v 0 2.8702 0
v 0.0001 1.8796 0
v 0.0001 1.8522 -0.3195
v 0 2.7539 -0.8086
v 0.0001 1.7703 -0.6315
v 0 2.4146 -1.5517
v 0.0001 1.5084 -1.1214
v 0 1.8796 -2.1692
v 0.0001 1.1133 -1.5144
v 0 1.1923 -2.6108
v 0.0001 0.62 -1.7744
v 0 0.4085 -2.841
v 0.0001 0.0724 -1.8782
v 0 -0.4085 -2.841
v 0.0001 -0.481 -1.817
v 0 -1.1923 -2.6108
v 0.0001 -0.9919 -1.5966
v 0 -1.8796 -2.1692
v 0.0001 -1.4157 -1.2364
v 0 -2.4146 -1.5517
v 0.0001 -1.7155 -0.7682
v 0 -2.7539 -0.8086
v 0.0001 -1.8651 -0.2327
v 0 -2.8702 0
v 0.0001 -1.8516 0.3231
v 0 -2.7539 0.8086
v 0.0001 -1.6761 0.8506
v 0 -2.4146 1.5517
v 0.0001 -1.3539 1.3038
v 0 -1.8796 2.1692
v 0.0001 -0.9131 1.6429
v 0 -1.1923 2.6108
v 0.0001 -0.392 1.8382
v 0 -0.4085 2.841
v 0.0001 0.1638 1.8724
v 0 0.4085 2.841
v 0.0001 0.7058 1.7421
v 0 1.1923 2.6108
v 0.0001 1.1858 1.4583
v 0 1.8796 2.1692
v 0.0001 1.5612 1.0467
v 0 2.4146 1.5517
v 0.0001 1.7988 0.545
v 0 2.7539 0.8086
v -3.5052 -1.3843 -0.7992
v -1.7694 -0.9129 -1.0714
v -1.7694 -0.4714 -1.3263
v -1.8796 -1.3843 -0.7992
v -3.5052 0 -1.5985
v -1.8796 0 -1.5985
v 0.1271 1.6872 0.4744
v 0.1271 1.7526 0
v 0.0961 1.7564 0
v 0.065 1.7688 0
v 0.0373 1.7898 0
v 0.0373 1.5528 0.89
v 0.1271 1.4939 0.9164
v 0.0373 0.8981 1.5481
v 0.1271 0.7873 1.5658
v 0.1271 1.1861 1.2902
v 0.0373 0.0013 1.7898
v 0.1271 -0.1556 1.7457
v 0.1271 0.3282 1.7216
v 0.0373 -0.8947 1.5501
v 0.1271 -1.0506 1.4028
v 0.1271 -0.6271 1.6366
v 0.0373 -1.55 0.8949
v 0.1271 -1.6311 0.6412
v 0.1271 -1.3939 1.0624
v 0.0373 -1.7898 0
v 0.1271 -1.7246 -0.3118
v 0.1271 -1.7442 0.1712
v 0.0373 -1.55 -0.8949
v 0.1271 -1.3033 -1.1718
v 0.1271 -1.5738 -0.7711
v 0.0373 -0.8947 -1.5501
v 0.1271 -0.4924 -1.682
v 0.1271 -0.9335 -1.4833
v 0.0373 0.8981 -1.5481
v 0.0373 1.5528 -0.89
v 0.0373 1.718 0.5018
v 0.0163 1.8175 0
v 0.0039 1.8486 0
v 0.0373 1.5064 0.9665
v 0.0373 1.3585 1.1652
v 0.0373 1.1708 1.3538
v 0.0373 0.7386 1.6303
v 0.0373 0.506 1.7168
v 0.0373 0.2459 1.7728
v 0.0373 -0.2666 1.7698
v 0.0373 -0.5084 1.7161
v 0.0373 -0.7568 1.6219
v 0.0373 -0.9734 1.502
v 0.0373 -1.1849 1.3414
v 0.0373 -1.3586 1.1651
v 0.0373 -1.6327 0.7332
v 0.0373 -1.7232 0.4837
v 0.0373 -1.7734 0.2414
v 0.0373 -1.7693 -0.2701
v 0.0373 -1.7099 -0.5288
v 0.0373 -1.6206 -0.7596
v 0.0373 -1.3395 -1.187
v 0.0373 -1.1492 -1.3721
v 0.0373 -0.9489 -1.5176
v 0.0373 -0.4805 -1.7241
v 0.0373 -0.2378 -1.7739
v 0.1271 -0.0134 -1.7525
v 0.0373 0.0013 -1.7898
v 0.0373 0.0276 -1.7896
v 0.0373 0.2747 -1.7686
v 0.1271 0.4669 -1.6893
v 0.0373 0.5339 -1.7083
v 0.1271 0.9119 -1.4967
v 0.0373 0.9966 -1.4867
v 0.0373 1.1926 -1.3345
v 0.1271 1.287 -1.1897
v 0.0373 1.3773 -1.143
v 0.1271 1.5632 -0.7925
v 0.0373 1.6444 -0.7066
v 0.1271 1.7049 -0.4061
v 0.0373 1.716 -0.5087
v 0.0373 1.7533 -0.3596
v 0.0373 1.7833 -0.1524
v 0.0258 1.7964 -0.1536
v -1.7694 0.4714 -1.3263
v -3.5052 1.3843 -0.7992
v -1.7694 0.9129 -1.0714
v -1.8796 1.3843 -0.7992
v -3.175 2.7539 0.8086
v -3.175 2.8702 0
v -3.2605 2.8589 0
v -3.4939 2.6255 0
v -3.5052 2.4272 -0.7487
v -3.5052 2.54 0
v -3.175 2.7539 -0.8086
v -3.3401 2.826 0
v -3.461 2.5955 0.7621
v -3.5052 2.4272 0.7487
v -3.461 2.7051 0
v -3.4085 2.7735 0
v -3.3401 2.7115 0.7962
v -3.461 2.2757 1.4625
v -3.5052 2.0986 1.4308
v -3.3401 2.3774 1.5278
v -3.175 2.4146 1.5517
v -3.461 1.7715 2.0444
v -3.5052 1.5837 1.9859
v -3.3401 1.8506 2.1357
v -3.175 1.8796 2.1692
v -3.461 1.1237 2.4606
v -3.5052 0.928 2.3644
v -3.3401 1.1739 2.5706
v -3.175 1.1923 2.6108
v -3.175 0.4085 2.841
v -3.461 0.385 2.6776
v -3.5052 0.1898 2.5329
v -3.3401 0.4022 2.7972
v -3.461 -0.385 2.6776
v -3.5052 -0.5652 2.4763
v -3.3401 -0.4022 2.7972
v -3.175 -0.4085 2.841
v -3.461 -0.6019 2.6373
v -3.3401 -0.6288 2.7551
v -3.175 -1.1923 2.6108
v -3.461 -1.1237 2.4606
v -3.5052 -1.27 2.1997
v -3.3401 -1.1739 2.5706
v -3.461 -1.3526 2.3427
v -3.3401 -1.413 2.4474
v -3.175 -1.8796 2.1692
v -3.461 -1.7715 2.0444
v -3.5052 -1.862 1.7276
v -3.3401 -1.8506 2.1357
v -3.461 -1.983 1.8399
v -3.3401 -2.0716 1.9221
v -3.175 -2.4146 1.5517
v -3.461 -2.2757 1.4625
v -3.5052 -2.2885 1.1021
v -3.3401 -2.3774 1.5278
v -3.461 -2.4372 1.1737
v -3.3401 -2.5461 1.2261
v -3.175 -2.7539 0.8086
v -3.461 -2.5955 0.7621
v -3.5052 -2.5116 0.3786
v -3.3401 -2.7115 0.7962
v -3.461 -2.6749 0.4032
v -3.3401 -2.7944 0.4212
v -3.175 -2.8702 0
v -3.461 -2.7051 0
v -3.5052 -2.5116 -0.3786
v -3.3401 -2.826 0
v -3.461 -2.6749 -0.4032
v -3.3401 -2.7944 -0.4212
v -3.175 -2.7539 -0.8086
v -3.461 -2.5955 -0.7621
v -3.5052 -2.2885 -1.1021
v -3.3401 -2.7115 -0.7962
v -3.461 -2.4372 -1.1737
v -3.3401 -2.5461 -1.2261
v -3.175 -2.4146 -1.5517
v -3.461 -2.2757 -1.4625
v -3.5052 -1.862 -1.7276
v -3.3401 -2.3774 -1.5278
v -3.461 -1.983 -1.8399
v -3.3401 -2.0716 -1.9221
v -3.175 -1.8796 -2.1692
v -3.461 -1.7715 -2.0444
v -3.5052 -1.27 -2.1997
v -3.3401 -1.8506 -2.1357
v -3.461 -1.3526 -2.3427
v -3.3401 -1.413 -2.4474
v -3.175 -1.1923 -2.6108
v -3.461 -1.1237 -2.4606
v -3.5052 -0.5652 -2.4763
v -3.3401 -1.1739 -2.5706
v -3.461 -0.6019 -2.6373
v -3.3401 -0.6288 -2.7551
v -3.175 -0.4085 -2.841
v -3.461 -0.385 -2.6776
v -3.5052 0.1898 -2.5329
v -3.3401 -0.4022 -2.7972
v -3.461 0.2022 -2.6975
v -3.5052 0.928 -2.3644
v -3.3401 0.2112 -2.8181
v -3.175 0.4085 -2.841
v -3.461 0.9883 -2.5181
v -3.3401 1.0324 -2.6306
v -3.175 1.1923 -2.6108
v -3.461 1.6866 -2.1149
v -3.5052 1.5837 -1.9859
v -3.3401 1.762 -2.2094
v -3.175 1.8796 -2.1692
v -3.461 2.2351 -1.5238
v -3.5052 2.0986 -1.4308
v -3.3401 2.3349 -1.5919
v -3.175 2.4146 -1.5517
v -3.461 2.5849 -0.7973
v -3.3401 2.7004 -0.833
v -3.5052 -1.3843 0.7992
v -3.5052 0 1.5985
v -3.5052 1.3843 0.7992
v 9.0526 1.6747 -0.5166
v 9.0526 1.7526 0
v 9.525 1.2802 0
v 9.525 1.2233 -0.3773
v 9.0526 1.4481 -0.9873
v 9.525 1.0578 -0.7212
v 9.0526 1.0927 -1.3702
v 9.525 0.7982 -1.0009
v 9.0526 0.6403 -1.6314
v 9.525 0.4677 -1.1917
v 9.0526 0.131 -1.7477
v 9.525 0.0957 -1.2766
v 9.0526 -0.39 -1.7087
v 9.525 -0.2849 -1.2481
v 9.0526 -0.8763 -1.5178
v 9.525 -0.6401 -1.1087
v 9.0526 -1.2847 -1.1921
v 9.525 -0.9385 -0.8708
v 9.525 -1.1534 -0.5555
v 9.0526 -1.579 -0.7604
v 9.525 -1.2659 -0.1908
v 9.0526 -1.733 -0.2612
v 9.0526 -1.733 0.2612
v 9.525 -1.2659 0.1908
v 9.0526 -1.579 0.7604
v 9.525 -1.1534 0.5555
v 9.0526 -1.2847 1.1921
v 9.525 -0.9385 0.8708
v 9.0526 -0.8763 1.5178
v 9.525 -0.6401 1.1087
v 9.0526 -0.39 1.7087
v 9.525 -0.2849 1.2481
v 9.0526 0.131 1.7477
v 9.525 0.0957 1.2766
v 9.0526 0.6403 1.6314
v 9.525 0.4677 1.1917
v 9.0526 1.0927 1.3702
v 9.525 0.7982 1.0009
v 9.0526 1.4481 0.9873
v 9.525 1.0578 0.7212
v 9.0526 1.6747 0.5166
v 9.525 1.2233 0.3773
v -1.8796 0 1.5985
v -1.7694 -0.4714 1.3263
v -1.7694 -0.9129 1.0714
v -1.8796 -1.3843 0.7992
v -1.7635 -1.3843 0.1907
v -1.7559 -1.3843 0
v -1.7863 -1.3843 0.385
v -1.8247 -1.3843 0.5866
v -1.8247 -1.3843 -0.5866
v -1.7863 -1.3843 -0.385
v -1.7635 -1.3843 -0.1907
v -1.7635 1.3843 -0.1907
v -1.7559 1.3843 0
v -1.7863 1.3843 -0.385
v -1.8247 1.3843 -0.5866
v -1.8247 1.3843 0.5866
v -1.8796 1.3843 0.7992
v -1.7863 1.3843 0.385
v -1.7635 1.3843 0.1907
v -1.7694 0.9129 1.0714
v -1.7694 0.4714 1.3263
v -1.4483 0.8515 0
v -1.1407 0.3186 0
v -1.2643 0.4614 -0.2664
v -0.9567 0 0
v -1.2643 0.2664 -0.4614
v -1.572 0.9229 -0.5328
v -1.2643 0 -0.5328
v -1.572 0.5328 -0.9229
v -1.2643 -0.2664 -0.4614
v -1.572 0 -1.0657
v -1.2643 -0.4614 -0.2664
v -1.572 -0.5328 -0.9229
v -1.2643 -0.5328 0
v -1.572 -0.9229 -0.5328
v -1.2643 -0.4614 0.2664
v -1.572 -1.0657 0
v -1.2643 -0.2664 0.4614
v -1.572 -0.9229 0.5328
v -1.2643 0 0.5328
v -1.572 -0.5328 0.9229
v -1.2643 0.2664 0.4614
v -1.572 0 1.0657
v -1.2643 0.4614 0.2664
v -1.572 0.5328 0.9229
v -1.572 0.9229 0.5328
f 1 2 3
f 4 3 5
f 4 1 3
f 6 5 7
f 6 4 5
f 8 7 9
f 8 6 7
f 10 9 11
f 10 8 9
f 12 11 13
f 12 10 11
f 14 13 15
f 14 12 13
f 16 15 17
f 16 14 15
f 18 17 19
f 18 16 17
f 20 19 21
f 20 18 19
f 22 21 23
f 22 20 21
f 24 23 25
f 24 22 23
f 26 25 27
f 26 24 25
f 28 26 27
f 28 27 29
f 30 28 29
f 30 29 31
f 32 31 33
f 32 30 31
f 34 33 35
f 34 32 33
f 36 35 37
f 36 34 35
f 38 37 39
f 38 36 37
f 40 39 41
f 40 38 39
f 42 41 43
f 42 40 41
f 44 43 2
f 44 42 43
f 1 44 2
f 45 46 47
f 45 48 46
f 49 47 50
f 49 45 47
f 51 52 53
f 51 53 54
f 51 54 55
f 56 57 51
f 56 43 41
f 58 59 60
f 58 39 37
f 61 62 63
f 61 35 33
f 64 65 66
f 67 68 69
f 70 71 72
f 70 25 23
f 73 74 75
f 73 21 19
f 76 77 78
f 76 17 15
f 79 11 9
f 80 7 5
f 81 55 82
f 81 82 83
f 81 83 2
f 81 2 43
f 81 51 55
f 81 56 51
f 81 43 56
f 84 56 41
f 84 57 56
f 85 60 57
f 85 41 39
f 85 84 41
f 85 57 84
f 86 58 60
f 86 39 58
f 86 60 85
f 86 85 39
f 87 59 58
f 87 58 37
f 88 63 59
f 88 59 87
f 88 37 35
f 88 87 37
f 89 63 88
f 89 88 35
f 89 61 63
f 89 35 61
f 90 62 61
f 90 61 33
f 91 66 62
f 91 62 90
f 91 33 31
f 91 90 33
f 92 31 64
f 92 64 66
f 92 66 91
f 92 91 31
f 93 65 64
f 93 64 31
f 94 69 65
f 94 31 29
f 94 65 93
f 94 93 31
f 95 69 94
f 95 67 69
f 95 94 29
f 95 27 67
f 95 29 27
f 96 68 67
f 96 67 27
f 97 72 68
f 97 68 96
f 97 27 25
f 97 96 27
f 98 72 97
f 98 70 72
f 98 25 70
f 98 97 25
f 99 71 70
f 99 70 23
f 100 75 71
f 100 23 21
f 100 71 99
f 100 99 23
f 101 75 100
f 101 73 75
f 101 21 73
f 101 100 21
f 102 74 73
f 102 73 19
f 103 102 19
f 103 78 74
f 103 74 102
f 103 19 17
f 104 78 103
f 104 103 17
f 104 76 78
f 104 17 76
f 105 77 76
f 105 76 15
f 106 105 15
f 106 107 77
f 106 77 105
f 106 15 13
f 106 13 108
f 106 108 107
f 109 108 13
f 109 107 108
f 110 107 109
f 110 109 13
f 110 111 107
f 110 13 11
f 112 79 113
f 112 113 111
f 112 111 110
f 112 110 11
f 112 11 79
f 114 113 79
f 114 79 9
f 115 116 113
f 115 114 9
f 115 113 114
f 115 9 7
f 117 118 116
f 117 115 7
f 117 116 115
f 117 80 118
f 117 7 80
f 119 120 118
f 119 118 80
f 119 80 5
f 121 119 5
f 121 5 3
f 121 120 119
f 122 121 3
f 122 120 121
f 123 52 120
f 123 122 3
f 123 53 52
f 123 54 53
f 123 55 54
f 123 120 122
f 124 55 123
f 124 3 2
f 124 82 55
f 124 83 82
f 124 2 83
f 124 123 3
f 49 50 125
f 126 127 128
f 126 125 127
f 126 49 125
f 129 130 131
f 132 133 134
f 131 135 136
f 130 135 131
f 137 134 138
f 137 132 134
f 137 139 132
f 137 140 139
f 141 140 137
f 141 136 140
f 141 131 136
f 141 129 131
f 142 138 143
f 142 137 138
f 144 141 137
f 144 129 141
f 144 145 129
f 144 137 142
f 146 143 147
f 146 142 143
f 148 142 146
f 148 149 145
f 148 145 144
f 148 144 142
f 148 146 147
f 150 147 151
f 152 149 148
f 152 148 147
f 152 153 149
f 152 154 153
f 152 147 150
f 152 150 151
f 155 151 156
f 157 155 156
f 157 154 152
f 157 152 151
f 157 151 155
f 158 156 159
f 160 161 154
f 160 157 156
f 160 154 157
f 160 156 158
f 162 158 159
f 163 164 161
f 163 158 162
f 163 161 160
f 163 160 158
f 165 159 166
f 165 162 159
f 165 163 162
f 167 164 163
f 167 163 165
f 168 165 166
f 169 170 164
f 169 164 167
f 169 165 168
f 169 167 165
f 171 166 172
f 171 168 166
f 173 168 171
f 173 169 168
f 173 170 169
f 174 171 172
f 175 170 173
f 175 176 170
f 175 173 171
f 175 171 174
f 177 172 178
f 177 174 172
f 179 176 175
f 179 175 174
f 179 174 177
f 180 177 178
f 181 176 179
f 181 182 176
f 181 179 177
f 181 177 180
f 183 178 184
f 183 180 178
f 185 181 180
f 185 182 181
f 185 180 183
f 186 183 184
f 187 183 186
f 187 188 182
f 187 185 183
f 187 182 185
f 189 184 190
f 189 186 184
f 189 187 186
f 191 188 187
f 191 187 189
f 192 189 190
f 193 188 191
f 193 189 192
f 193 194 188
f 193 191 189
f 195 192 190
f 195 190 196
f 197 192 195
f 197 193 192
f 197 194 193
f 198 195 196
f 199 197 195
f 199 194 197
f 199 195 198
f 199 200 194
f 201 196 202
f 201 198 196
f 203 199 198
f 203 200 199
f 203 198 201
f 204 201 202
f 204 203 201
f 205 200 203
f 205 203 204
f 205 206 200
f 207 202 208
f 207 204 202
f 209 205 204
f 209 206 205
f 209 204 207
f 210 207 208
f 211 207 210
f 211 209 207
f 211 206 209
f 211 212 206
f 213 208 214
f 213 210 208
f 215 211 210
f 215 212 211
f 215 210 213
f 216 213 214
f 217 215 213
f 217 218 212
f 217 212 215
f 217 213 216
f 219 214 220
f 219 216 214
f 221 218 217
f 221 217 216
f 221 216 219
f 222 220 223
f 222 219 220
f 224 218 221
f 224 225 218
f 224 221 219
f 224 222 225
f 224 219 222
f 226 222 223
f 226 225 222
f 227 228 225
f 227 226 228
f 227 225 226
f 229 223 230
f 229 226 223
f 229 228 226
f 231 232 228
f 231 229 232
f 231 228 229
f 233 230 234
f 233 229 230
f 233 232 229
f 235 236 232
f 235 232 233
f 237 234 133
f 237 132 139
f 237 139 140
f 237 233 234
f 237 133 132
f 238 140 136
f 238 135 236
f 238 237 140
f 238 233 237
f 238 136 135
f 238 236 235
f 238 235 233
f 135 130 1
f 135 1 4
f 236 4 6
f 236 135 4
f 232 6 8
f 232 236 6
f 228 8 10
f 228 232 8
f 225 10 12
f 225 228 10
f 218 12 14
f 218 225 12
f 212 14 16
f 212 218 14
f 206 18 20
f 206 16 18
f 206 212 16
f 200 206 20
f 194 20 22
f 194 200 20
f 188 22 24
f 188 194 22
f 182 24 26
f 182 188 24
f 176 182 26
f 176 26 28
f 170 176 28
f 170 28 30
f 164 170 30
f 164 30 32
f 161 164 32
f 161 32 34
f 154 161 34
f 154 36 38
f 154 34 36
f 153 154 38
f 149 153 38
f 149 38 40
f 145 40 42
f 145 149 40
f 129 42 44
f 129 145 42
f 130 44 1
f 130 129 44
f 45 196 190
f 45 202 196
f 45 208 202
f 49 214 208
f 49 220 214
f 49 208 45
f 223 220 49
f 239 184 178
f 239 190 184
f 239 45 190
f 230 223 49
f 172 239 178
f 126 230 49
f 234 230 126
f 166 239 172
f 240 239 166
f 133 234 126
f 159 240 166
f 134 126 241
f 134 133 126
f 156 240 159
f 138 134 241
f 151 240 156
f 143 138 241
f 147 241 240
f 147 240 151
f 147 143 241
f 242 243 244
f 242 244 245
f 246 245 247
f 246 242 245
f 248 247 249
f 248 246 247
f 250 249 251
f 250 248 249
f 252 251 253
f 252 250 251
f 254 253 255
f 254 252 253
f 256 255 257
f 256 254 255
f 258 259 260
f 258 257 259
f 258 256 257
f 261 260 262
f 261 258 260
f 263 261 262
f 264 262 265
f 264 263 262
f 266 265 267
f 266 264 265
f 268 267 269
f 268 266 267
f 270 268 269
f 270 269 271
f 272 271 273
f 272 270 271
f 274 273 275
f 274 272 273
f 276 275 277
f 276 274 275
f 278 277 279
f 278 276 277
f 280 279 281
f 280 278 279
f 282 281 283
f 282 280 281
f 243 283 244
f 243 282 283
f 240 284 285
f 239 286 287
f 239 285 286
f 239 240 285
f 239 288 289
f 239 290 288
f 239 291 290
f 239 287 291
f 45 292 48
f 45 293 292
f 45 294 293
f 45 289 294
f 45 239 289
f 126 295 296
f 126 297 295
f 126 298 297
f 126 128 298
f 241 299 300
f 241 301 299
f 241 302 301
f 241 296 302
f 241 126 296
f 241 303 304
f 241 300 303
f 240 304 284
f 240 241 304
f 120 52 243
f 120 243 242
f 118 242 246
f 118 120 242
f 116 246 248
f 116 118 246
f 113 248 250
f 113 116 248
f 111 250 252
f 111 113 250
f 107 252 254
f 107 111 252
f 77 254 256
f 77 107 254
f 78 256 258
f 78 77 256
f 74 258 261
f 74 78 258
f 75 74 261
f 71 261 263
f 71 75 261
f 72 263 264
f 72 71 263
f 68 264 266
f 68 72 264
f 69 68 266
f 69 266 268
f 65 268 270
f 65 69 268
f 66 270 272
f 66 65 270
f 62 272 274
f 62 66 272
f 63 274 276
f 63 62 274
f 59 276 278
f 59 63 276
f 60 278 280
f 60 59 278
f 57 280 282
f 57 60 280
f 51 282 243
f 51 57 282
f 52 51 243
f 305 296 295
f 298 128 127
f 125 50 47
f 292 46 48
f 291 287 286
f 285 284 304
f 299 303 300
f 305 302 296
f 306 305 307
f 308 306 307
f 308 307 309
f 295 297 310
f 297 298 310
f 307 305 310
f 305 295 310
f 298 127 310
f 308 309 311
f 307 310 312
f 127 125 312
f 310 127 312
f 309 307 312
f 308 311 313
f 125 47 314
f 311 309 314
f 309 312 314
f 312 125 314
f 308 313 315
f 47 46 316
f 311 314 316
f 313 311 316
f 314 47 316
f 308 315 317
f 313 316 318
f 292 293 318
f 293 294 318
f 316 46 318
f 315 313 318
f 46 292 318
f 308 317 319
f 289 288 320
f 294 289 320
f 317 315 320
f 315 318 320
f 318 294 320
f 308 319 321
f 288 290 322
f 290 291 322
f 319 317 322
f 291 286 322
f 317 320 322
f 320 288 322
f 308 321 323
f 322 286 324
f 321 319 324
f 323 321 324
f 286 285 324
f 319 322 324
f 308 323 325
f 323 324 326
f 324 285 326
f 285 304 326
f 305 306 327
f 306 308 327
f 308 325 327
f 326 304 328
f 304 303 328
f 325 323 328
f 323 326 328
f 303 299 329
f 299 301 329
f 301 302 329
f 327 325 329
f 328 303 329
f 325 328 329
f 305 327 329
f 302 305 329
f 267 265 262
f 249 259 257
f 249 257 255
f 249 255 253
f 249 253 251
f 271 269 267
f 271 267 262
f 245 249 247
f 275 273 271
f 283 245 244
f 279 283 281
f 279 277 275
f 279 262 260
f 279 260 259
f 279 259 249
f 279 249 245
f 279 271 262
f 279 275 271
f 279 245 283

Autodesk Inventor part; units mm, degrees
ref_plane "YZ Plane" through (0, 0, 0) normal (1, 0, 0) x (0, 1, 0)
ref_plane "XZ Plane" through (0, 0, 0) normal (0, 1, 0) x (-1, 0, 0)
sketch "Sketch1" plane through (0, 0, 0) normal (0, 0, 1) x (1, 0, 0)
  line L0 (-0.9567, 0) -> (9.525, 0)
  line L1 (9.525, 0) -> (9.525, 1.7526)
  line L2 (9.525, 1.7526) -> (1.9844, 1.7526)
  line L3 (1.9844, 1.7526) -> (0.0001, 1.7526)
  line L4 (0.0001, 1.7526) -> (0, 1.7526)
  line L5 (0, 1.7526) -> (0, 2.8702)
  line L6 (0, 2.8702) -> (-3.5052, 2.8702)
  line L7 (-3.5052, 2.8702) -> (-3.5052, 1.5985)
  line L8 (-3.5052, 1.5985) -> (-1.8796, 1.5985)
  line L9 (-1.8796, 1.5985) -> (-0.9567, 0)
  line L10 (-6.1112, 0) -> (12.131, 0) projected
  line L11 (0, -0.574) -> (0, 3.4442) projected
  line L12 (1.9844, 1.7526) -> (0, 1.7526) construction
  dimension "d1" = 7.5405
  dimension "d2" = 1.9844
  dimension "d3" = 3.5052
  dimension "d4" = 1.6256
  dimension "d5" = 60
  dimension "d6" = 3.5052
  dimension "d7" = 3.5052
  dimension "d8" = 3.1969
  dimension "d9" = 5.7404
  dimension "d26" = 9.525
revolve "Body" add sketch "Sketch1" angle 360 about axis through (-0.9567, 0, 0) along (1, 0, 0)
sketch "Sketch2" plane through (-3.5052, 0, 0) normal (-1, 0, 0) x (0, 0, 1)
  circle A0 centre (0, 0) radius 1.5985 projected
  line L0 (0, -4.0183) -> (0, 4.0183) projected
  line L1 (-4.0183, 0) -> (4.0183, 0) projected
  line L2 (1.5985, 0) -> (0.7992, -1.3843)
  line L3 (0.7992, -1.3843) -> (-0.7992, -1.3843)
  line L4 (-0.7992, -1.3843) -> (-1.5985, 0)
  line L5 (-1.5985, 0) -> (-0.7992, 1.3843)
  line L6 (-0.7992, 1.3843) -> (0.7992, 1.3843)
  line L7 (0.7992, 1.3843) -> (1.5985, 0)
extrude "Slot" add sketch "Sketch2" against normal up to next contours L7 A0 | A0 L2 | L6 L0 A0 | A0 L0 L3 | L0 L6 A0 | A0 L3 L0 | L4 A0 | A0 L5
fillet "Fillet1" radius 0.3302 1 edges at (-3.5052, -2.8702, 0)
thread "Thread" size "6-32 UNC" class "2A" standard "ANSI Unified Screw Threads" length 7.5406
chamfer "Chamfer1" distance 0.4724 distance2 0.4724 1 edges at (9.525, -1.7526, 0) measured on face at (9.525, 0.5173, 0.2715)
ref_plane "Work Plane1" through (29, 0, 0) normal (0, -1, 0) x (1, 0, 0)
fillet "Fillet2" radius 0.127 1 edges at (0.0001, -1.7526, 0)
equation "\"d1\" = GEL"
equation "\"d3\" = KOH"
equation "\"d4\" = INTI"
equation "\"d6\" = GD"
equation "\"d7\" = BDM"
equation "\"d8\" = 1.1547 * SW"
equation "\"d9\" = KOD"
equation "\"d26\" = NLG"
equation "\"d30\" = R"
equation "\"d17\" = RR"
equation "\"d13\" = GEL"
equation "\"d15\" = -0.5 * SPD + 0.5 * GD"
equation "\"d16\" = GUL"
equation "\"GD\" = 3.5052"
equation "\"NLG\" = 9.525"
equation "\"GEL\" = 7.54055"
equation "\"KOD\" = 5.7404"
equation "\"KOH\" = 3.5052"
equation "\"INTI\" = 1.6256"
equation "\"GAL\" = 1.98425"
equation "\"GUL\" = 0.47244"
equation "\"BDM\" = 3.5052"
equation "\"SW\" = 2.7686"
equation "\"RR\" = 0.3302"
equation "\"SPD\" = 2.56032"
equation "\"R\" = 0.127"
equation "\"PHH\" = 0.127"
equation "\"GD1\" = SPD"
equation "\"THREADDIA\" = 3.5052"
equation "\"FAWI\" = 45deg"
equation "\"KOH1\" = 3.1496"
equation "\"NND\" = 3.5052"
equation "\"TOA\" = 30deg"
equation "\"E0\" = 1.155 * SW"
properties part number "ANSI B18.3 - No. 6 - 32 UNC - 3/8 HS HCS" material "Steel, Alloy"
